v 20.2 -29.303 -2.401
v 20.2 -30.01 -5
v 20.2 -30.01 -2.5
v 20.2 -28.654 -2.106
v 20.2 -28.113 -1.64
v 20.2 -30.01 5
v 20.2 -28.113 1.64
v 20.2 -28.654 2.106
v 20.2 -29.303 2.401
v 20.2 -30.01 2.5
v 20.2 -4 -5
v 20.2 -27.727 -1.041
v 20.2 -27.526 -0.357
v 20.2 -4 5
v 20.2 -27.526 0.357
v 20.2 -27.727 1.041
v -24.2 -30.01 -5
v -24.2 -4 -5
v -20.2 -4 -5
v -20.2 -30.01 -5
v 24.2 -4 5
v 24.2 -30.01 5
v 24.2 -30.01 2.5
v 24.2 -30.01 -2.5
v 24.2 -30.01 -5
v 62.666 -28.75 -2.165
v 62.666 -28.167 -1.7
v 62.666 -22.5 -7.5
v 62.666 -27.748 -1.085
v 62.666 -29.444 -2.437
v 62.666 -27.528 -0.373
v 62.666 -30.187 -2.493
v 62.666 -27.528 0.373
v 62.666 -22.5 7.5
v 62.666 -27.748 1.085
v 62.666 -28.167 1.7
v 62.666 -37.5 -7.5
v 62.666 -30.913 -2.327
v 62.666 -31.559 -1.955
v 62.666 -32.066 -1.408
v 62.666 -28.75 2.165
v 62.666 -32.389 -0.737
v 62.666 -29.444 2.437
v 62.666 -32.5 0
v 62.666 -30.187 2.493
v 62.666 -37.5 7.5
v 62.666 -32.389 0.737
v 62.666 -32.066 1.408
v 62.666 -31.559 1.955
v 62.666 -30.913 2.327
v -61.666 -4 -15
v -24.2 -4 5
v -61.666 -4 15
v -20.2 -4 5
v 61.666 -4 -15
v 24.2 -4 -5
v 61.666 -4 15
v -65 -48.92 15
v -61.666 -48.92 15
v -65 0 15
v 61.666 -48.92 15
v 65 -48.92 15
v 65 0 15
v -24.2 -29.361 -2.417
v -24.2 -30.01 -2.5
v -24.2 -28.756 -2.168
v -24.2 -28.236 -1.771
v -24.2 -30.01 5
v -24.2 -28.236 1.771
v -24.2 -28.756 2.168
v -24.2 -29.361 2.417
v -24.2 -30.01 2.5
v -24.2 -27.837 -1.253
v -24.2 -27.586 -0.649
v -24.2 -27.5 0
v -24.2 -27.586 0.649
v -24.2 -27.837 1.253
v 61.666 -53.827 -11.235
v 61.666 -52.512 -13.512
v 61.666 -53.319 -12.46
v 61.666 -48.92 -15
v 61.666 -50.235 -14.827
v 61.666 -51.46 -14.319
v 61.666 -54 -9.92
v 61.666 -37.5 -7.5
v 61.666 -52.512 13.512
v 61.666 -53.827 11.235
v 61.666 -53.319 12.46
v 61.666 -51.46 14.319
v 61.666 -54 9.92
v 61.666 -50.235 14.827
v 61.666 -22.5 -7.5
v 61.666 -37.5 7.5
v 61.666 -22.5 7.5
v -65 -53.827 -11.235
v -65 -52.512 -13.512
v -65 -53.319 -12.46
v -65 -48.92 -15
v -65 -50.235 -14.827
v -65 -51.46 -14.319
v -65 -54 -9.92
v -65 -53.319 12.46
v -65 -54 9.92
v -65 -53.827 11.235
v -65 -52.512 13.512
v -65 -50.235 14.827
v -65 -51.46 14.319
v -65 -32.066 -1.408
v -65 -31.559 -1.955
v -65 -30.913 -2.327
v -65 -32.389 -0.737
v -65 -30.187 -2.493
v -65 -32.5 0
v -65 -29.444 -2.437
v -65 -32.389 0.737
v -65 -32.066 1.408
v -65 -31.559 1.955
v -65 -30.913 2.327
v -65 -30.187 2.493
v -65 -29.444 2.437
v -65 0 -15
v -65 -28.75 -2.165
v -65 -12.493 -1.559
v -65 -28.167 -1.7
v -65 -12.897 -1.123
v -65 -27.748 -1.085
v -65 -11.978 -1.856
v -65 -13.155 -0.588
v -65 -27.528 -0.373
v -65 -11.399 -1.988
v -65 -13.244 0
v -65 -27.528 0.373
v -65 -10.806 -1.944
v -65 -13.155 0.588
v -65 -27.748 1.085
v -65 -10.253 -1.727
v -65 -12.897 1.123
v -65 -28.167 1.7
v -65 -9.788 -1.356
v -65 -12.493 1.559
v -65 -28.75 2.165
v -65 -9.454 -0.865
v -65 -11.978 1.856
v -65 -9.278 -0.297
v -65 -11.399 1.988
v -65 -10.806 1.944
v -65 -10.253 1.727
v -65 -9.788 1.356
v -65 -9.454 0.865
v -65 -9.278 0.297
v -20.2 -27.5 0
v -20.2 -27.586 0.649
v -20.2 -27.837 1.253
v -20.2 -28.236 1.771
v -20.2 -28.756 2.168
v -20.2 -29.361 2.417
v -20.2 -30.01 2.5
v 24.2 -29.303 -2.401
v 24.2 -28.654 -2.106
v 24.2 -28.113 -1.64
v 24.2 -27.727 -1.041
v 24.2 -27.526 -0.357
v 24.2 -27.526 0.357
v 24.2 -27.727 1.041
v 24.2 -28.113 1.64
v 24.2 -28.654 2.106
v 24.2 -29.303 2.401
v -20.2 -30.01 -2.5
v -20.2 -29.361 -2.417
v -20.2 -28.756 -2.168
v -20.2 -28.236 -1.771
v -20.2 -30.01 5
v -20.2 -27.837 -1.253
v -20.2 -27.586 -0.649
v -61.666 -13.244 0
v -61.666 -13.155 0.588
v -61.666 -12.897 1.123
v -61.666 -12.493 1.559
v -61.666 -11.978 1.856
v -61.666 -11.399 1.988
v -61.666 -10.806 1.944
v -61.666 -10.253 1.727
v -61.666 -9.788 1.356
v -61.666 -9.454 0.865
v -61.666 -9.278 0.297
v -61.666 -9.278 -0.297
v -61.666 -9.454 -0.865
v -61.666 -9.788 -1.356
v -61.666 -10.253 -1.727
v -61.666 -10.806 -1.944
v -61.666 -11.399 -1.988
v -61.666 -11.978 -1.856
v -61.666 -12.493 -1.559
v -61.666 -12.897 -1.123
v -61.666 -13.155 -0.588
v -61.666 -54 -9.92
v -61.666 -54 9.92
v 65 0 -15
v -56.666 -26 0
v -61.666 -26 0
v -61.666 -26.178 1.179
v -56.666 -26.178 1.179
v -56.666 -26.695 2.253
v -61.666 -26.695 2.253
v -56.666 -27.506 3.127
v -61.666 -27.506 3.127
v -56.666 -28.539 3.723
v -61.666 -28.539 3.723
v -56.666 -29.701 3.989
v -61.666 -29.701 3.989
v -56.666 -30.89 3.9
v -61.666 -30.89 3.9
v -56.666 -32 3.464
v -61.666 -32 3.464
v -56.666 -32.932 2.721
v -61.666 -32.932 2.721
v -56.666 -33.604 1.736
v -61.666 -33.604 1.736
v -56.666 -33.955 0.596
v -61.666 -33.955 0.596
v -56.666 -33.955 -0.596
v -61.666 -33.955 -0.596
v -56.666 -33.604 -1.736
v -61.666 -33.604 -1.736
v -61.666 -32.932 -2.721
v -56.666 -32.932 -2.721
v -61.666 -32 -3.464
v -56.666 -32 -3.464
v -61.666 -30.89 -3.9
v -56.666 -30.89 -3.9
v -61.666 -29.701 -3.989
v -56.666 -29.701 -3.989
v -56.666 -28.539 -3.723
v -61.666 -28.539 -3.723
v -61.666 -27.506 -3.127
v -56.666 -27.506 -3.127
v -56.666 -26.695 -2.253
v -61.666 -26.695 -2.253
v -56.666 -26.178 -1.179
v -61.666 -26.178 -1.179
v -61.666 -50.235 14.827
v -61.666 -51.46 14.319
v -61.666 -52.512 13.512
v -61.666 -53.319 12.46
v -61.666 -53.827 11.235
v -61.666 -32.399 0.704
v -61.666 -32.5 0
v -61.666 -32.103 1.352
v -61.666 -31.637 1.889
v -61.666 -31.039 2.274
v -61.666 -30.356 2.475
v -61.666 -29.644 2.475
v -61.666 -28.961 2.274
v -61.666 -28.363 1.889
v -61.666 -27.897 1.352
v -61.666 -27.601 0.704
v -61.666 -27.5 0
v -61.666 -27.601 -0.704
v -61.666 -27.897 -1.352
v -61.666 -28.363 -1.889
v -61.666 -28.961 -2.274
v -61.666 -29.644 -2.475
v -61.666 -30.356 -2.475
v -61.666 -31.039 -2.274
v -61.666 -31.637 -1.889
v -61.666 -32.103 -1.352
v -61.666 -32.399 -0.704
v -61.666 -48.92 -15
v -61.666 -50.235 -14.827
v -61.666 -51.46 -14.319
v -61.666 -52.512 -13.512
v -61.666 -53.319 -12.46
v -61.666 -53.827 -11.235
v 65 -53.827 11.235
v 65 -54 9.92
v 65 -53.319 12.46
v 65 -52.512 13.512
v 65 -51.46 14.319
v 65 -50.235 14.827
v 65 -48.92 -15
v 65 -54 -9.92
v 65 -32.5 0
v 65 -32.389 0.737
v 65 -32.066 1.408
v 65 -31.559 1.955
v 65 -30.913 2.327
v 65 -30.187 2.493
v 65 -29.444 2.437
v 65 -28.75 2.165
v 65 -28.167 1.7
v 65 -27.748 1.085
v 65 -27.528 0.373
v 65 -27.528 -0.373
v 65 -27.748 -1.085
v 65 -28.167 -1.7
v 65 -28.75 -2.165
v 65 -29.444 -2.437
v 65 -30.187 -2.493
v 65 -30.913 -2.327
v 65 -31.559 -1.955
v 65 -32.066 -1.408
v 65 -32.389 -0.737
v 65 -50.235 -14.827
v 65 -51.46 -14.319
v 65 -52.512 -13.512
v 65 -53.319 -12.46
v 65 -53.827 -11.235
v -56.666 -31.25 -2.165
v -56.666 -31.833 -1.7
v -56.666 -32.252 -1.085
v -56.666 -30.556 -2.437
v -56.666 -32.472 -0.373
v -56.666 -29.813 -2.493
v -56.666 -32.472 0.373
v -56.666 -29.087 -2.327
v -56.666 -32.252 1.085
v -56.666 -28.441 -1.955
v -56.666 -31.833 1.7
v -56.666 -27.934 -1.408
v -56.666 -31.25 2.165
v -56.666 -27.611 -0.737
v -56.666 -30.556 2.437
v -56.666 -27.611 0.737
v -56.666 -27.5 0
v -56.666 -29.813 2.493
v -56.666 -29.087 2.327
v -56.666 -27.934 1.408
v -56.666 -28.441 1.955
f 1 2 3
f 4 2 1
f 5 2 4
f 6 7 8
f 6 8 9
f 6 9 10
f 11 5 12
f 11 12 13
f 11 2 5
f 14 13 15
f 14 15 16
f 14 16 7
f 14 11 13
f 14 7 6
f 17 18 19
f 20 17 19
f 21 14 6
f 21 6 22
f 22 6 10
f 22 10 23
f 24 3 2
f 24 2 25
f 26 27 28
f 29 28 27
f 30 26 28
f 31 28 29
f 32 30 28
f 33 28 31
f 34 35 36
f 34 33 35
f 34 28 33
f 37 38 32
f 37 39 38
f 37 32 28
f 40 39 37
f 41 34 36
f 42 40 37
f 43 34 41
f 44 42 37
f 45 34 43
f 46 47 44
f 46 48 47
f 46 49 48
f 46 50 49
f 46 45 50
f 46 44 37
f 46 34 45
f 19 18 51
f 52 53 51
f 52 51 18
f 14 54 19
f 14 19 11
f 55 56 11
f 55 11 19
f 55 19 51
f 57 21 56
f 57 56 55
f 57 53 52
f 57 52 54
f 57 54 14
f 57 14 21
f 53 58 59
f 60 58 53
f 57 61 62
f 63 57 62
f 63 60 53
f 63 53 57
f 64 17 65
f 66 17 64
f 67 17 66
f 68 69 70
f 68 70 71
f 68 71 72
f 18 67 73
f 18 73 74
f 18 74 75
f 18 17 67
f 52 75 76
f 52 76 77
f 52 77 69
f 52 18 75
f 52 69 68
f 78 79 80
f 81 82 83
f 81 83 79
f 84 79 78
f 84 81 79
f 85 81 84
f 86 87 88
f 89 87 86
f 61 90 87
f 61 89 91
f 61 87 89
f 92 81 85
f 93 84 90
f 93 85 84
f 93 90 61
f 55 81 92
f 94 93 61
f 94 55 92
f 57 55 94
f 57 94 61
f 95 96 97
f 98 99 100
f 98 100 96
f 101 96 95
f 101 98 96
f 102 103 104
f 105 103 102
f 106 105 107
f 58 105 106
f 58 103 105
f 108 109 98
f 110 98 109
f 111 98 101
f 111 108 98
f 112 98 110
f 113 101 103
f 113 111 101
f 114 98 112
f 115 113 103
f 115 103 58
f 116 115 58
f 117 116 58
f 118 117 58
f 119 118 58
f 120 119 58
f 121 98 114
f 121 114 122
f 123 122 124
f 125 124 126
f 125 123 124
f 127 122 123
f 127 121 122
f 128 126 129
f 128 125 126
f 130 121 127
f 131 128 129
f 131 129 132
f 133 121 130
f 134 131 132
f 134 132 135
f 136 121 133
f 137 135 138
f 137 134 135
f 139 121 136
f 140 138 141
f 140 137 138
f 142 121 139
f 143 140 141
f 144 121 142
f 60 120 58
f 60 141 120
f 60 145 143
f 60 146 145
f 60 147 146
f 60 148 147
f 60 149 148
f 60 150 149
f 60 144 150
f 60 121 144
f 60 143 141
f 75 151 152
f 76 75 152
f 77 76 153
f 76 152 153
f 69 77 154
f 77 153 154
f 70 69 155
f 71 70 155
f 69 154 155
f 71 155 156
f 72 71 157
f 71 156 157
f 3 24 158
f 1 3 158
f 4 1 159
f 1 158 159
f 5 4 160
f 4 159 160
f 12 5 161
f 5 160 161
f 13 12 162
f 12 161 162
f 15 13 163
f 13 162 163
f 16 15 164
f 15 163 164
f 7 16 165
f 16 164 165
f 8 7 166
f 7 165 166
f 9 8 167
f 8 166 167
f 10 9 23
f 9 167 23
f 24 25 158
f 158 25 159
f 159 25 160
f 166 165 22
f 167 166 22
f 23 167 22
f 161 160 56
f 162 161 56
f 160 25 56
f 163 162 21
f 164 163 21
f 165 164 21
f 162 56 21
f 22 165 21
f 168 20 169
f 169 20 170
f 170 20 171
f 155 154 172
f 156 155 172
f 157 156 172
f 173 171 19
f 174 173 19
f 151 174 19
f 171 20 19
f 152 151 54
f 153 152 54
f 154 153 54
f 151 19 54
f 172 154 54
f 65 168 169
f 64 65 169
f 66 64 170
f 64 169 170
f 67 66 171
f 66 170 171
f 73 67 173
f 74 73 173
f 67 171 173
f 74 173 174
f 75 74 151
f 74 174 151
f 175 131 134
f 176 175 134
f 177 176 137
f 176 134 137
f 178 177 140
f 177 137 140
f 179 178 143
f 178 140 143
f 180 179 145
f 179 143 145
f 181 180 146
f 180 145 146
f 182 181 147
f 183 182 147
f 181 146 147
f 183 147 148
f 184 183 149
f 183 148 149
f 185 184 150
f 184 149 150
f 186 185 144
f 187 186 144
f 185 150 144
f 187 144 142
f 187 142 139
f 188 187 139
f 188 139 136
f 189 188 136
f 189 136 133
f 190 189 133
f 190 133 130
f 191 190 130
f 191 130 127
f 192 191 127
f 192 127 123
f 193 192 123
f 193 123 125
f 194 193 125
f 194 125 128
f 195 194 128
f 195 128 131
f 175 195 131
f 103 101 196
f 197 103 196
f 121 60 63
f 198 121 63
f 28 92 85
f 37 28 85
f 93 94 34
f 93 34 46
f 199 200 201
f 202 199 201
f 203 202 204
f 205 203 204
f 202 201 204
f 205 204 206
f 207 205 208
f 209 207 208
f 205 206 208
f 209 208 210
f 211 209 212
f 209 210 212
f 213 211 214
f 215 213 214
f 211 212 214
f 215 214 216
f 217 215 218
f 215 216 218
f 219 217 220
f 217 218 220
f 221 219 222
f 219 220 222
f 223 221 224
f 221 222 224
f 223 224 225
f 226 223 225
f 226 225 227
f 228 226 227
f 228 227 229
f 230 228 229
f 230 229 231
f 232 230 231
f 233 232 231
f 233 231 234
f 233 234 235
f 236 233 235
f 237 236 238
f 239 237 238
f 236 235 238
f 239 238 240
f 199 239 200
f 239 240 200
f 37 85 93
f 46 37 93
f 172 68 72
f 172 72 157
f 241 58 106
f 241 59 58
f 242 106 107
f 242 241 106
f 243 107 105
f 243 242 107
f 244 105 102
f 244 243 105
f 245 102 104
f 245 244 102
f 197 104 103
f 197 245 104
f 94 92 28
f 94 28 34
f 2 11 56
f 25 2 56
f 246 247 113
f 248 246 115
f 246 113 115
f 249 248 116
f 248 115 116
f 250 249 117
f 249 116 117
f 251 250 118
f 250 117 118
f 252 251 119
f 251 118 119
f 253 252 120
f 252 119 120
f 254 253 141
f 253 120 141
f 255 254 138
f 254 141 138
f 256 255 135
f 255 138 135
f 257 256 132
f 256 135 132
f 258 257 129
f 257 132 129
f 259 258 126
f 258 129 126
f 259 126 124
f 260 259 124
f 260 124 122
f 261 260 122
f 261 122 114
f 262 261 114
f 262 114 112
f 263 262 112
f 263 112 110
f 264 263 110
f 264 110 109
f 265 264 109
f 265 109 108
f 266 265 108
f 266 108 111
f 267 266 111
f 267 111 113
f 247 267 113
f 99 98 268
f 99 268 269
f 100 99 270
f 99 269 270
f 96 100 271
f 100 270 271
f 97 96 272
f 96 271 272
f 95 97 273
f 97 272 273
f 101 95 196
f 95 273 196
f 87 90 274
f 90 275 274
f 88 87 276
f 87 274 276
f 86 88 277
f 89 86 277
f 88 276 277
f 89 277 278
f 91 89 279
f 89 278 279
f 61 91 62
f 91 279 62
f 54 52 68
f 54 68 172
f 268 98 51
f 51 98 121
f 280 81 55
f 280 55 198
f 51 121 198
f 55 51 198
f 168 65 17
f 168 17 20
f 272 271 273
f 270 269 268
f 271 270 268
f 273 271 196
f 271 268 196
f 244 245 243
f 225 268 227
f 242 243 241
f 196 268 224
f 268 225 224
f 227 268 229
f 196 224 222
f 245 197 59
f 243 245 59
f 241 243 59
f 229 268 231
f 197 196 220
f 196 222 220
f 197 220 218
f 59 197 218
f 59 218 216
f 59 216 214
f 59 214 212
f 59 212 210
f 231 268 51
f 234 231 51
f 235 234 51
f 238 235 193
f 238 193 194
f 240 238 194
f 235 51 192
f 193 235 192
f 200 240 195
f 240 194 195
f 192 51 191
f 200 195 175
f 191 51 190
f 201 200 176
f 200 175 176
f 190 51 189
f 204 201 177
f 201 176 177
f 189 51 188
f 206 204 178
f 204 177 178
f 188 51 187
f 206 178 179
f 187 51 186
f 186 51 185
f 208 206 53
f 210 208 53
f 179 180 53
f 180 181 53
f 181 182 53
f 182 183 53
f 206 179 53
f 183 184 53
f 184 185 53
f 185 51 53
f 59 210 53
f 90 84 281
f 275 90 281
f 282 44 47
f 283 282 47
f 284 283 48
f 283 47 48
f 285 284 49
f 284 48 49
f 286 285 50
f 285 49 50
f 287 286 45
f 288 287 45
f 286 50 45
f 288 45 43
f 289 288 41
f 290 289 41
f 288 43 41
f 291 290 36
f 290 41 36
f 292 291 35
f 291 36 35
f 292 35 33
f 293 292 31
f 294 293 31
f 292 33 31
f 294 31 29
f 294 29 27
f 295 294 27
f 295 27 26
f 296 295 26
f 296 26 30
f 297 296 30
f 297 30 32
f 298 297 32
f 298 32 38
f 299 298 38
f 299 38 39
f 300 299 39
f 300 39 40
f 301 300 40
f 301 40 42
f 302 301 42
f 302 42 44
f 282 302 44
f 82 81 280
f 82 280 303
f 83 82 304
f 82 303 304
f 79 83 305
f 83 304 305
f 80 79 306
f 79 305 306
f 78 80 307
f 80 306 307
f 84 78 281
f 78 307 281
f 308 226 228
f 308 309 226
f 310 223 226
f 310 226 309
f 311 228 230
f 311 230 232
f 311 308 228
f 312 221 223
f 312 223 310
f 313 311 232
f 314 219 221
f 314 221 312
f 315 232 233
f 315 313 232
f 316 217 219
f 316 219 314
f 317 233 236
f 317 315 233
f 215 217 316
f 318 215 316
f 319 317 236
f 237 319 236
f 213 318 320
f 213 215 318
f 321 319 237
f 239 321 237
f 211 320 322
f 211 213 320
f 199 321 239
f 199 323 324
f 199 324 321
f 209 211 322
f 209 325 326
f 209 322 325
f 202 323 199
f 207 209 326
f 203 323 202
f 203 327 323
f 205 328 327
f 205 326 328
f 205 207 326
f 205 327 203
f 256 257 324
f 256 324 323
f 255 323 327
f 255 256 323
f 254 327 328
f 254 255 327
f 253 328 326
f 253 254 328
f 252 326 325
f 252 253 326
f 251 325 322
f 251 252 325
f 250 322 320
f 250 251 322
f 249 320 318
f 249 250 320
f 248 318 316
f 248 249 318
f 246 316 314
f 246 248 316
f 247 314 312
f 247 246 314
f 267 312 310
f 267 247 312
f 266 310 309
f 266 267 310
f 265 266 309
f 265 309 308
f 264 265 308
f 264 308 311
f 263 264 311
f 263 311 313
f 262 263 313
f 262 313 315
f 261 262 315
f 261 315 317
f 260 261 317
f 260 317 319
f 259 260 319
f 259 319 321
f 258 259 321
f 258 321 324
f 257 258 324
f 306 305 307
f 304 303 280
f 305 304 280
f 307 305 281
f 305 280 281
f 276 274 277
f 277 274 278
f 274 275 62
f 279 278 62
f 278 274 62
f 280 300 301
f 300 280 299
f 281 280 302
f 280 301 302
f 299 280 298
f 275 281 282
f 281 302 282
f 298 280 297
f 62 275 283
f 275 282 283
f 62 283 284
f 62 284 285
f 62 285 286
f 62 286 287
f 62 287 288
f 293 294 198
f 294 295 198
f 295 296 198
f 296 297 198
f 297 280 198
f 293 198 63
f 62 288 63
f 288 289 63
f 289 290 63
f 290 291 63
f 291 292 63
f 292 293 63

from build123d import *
from build123d import SkipClean  # not in build123d's __all__

# Parameters (mm, degrees)
F0_W      = 130
F0_H      = 30
F1_DEPTH  = 4
F2_W      = 3.3338604867
F2_H      = 30
F3_DEPTH  = 50
F4_R      = 5.08
F5_R      = 2.5
F6_DEPTH  = 137.16
F7_R      = 4
F7_R_2    = 2.5
F8_DEPTH  = 5
F9_W      = 15
F9_H      = 15
F9_R      = 2.5
F10_DEPTH = 1
F11_W     = 4
F11_H     = 10
F12_DEPTH = 26.0096
F14_DEPTH = 14.224
F16_DEPTH = 6.096
F17_R     = 1.9939
F18_DEPTH = 25.4


# Not quite as in the source:
# - after a boolean that leaves OpenCascade's solid faulty, fix() repairs it
# - a feature names something its author has since deleted; it is built from what else it names


with BuildPart() as f1:
    # F0 (on Front) → F1 (new body)
    with BuildSketch(Plane.XZ):
        Rectangle(F0_W, F0_H)
    extrude(amount=F1_DEPTH)

    # F2 (on face) → F3 (join)
    with BuildSketch(Plane.XZ.offset(4)):
        with Locations((-63.3330697566, 0)):
            Rectangle(F2_W, F2_H)
        with Locations((63.3330697566, 0)):
            Rectangle(F2_W, F2_H)
    extrude(amount=F3_DEPTH)

    # F4
    f4_edges = [f1.edges().sort_by_distance(p)[0] for p in [
        (63.33307, -54, 15),
        (63.33307, -54, -15),
        (-63.33307, -54, -15),
        (-63.33307, -54, 15),
    ]]
    fillet(f4_edges, radius=F4_R)

    # F5 (on face) → F6 (cut)
    with BuildSketch(Plane(origin=(-65, 0, 0), x_dir=(0, -1, 0), z_dir=(-1, 0, 0))):
        with Locations((30, 0)):
            Circle(F5_R)
    extrude(amount=-F6_DEPTH, mode=Mode.SUBTRACT)

    # F7 (on face) → F8 (join)
    with BuildSketch(Plane.YZ.offset(-61.6661395133)):
        with Locations((-30, 0)):
            Circle(F7_R)
        with Locations((-30, 0)):
            Circle(F7_R_2, mode=Mode.SUBTRACT)
    with SkipClean():  # cleaning this boolean's faces spoils the solid; the shape is the same uncleaned
        extrude(amount=F8_DEPTH)

    # F9 (on face) → F10 (cut)
    with BuildSketch(Plane(origin=(61.6661395133, 0, 0), x_dir=(0, -1, 0), z_dir=(-1, 0, 0))):
        with Locations((30, 0)):
            Rectangle(F9_W, F9_H)
        with Locations((30, 0)):
            Circle(F9_R, mode=Mode.SUBTRACT)
    extrude(amount=-F10_DEPTH, mode=Mode.SUBTRACT)

    add(f1.part.fix(), mode=Mode.REPLACE)

    # F11 (on face) → F12 (join)
    with BuildSketch(Plane.XZ.offset(4)):
        with Locations((-22.1996698529, 0)):
            Rectangle(F11_W, F11_H)
        with Locations((22.1996698529, 0)):
            Rectangle(F11_W, F11_H)
    extrude(amount=F12_DEPTH)

    # F13 (on face) → F14 (cut)
    with BuildSketch(Plane.YZ.offset(-20.1996698529)):
        with BuildLine():
            ThreePointArc((-30.0096, -2.4999815679), (-28.2356304242, -1.7711578134), (-27.5, 0))
            ThreePointArc((-27.5, 0), (-28.2356304242, 1.7711578134), (-30.0096, 2.4999815679))
            Line((-30.0096, 2.4999815679), (-30.0096, -2.4999815679))
        make_face()
    extrude(amount=-F14_DEPTH, mode=Mode.SUBTRACT)

    # F15 (on face) → F16 (cut)
    with BuildSketch(Plane.YZ.offset(24.1996698529)):
        with BuildLine():
            Line((-30.0096, 2.4999815679), (-30.0096, -2.4999815679))
            ThreePointArc((-30.0096, -2.4999815679), (-27.5, 0), (-30.0096, 2.4999815679))
        make_face()
    extrude(amount=-F16_DEPTH, mode=Mode.SUBTRACT)

    # F17 (on face) → F18 (cut)
    with BuildSketch(Plane(origin=(-65, 0, 0), x_dir=(0, -1, 0), z_dir=(-1, 0, 0))):
        with Locations((11.25, 0)):
            Circle(F17_R)
    extrude(amount=-F18_DEPTH, mode=Mode.SUBTRACT)


solid = f1.part
